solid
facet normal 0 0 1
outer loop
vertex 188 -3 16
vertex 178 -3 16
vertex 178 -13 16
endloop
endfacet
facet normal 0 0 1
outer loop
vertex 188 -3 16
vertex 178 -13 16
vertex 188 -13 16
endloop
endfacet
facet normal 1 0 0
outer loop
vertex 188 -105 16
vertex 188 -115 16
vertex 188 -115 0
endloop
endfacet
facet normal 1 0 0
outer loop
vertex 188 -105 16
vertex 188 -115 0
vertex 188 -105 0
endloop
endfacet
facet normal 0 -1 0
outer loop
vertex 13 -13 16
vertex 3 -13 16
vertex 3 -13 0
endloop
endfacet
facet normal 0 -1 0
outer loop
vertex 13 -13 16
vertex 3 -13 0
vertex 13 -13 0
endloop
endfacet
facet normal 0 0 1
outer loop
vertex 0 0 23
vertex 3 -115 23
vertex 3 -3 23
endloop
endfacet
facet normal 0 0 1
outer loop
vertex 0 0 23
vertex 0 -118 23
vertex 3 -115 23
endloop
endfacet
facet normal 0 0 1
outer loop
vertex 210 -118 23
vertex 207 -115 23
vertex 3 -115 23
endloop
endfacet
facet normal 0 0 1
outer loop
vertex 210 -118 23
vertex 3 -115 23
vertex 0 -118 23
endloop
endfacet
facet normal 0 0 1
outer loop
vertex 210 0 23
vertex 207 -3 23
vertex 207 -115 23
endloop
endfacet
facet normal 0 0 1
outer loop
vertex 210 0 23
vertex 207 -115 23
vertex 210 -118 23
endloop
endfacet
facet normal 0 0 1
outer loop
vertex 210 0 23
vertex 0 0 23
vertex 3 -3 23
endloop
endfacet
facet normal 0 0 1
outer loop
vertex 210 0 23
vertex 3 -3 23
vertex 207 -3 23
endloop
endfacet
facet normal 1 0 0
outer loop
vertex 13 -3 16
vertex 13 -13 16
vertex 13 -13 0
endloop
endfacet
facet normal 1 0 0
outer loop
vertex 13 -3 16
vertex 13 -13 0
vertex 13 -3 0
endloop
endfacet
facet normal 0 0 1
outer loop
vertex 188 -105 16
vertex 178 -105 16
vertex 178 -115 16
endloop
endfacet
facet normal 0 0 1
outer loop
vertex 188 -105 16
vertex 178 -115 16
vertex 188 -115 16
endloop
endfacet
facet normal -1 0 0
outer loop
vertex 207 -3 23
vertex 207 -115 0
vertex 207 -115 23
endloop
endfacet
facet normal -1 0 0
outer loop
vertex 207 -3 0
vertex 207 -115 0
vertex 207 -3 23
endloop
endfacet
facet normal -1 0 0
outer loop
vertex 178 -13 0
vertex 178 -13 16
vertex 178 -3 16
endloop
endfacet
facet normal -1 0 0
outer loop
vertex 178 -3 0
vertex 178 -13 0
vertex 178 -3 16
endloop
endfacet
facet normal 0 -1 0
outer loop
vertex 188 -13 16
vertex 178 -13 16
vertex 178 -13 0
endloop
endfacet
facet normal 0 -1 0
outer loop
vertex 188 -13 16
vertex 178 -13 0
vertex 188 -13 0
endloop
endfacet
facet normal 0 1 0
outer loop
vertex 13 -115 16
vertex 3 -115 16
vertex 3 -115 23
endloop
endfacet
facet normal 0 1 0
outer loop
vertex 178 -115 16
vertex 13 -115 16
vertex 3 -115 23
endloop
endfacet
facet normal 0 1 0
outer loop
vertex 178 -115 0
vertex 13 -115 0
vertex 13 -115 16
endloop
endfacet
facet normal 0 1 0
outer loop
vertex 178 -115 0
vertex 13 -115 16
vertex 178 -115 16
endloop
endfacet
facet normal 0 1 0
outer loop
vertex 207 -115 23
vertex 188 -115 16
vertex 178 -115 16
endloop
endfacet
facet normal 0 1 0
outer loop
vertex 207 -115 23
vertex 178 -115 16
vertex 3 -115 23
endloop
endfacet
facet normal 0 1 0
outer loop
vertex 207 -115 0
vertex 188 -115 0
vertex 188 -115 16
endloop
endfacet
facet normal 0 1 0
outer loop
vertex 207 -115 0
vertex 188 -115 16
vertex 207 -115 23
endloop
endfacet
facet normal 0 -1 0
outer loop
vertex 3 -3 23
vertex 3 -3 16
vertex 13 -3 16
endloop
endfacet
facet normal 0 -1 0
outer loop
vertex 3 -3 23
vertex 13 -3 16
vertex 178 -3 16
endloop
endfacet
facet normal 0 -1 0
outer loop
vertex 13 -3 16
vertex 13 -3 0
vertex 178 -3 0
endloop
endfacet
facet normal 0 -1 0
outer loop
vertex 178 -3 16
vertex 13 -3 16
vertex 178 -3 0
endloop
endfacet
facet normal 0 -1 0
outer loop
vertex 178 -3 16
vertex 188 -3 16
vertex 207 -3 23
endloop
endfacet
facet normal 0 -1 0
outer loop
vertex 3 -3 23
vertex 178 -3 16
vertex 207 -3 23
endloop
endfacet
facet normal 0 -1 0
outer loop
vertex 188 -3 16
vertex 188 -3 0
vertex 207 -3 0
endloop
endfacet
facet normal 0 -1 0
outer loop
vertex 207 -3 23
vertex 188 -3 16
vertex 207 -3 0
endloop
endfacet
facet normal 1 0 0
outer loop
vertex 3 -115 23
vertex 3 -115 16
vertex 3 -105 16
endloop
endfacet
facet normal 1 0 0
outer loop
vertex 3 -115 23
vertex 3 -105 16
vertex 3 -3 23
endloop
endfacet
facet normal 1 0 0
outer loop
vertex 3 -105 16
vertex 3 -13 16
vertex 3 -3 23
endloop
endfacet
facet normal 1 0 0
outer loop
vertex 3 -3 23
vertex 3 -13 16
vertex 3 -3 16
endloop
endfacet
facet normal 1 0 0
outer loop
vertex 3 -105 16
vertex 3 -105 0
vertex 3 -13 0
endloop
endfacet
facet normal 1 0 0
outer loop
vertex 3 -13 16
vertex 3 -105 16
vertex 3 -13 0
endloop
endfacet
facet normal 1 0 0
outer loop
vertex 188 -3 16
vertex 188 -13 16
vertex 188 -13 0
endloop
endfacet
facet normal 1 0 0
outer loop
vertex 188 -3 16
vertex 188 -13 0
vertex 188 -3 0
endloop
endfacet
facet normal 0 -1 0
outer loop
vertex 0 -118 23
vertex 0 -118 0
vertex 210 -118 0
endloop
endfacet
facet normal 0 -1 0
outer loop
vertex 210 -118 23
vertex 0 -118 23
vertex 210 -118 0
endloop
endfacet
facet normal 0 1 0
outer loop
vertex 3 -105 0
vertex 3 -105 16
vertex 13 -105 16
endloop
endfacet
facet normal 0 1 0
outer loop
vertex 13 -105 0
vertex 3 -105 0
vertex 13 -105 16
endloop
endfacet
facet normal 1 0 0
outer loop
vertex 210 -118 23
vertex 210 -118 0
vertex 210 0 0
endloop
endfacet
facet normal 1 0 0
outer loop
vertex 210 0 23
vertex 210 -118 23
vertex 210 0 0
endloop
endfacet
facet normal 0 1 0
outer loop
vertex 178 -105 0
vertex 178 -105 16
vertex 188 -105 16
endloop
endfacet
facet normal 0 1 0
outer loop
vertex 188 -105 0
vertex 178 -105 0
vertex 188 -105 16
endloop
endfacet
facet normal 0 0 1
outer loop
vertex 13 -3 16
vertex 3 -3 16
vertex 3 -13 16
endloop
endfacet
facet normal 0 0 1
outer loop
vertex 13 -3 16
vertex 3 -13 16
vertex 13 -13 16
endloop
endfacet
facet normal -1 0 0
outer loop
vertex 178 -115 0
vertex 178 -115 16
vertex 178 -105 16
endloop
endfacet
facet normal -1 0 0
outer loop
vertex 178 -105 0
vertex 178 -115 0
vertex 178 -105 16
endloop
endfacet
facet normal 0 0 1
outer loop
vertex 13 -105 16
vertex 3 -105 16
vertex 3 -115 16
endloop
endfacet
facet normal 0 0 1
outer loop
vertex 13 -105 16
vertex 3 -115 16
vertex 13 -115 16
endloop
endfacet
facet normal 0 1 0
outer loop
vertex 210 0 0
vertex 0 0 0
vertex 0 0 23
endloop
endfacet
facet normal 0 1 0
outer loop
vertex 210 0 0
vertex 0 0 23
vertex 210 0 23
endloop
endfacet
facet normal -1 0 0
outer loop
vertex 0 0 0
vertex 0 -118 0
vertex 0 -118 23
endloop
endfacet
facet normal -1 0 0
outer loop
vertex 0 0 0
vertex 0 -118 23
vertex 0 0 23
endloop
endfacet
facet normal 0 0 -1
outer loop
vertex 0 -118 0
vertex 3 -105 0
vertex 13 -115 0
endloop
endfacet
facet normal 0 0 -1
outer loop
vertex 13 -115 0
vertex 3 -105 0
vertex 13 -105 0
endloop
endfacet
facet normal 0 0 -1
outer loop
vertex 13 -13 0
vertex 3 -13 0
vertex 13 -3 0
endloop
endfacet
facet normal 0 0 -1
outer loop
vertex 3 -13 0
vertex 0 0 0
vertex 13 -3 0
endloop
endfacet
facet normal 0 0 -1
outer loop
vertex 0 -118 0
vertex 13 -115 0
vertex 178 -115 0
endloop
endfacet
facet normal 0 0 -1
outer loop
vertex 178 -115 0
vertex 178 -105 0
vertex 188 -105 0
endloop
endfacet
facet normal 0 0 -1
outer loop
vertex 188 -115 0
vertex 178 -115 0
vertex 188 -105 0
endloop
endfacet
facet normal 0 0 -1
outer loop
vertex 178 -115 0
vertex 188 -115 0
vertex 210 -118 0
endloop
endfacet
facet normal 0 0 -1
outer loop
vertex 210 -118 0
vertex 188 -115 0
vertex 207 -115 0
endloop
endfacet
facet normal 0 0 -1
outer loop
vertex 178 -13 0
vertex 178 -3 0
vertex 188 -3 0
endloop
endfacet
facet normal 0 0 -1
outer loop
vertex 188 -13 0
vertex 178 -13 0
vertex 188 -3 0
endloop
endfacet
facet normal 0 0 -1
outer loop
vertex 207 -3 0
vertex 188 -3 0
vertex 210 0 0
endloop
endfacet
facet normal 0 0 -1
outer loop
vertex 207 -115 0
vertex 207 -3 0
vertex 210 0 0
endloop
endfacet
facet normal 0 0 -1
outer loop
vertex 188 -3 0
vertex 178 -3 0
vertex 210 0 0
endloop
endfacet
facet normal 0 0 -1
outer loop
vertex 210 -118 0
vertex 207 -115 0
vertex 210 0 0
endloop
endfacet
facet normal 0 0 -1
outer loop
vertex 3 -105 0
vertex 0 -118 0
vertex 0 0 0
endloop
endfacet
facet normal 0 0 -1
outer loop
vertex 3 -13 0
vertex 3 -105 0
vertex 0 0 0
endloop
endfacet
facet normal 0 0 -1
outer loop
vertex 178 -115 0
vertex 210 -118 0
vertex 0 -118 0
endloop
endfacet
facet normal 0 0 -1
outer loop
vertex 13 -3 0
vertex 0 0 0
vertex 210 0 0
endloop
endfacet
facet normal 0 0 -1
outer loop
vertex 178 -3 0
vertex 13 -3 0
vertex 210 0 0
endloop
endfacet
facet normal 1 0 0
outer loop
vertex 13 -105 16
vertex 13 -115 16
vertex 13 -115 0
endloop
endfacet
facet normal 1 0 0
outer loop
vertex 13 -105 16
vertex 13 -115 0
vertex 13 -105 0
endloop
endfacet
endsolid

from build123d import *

# Parameters (mm, degrees)
F0_W     = 210
F0_H     = 118
F1_DEPTH = 23
F2_T     = -3
F3_W     = 10
F3_H     = 10
F4_DEPTH = 13
F5_R     = 1.75
F6_DEPTH = 25
F7_DEPTH = 25


with BuildPart() as f1:
    # F0 (on Top) → F1 (new body)
    with BuildSketch(Plane.XY):
        with Locations((105, -59)):
            Rectangle(F0_W, F0_H)
    extrude(amount=F1_DEPTH)

    # F2
    f2_openings = [f1.faces().sort_by_distance(p)[0] for p in [
        (105, -59, 23),
    ]]
    offset(amount=F2_T, openings=f2_openings)

    # F3 (on face) → F4 (join)
    with BuildSketch(Plane.XY.offset(3)):
        with Locations((8, -8)):
            Rectangle(F3_W, F3_H)
        with Locations((183, -8)):
            Rectangle(F3_W, F3_H)
        with Locations((183, -110)):
            Rectangle(F3_W, F3_H)
        with Locations((8, -110)):
            Rectangle(F3_W, F3_H)
    extrude(amount=F4_DEPTH)

    # F5 (on face) → F6 (cut)
    with BuildSketch(Plane.XY.offset(3)):
        with Locations((20, -8)):
            Circle(F5_R)
        with Locations((20, -38)):
            Circle(F5_R)
        with Locations((80, -38)):
            Circle(F5_R)
        with Locations((80, -8)):
            Circle(F5_R)
        with Locations((120, -17.5)):
            Circle(F5_R)
    extrude(amount=-F6_DEPTH, mode=Mode.SUBTRACT)

    # F7 (cut): a face of the model
    f7_faces = [f1.faces().sort_by_distance(p)[0] for p in [
        (105.2576945696, -59.0796753379, 3),
    ]]
    extrude(f7_faces, amount=-F7_DEPTH, mode=Mode.SUBTRACT)


solid = f1.part
